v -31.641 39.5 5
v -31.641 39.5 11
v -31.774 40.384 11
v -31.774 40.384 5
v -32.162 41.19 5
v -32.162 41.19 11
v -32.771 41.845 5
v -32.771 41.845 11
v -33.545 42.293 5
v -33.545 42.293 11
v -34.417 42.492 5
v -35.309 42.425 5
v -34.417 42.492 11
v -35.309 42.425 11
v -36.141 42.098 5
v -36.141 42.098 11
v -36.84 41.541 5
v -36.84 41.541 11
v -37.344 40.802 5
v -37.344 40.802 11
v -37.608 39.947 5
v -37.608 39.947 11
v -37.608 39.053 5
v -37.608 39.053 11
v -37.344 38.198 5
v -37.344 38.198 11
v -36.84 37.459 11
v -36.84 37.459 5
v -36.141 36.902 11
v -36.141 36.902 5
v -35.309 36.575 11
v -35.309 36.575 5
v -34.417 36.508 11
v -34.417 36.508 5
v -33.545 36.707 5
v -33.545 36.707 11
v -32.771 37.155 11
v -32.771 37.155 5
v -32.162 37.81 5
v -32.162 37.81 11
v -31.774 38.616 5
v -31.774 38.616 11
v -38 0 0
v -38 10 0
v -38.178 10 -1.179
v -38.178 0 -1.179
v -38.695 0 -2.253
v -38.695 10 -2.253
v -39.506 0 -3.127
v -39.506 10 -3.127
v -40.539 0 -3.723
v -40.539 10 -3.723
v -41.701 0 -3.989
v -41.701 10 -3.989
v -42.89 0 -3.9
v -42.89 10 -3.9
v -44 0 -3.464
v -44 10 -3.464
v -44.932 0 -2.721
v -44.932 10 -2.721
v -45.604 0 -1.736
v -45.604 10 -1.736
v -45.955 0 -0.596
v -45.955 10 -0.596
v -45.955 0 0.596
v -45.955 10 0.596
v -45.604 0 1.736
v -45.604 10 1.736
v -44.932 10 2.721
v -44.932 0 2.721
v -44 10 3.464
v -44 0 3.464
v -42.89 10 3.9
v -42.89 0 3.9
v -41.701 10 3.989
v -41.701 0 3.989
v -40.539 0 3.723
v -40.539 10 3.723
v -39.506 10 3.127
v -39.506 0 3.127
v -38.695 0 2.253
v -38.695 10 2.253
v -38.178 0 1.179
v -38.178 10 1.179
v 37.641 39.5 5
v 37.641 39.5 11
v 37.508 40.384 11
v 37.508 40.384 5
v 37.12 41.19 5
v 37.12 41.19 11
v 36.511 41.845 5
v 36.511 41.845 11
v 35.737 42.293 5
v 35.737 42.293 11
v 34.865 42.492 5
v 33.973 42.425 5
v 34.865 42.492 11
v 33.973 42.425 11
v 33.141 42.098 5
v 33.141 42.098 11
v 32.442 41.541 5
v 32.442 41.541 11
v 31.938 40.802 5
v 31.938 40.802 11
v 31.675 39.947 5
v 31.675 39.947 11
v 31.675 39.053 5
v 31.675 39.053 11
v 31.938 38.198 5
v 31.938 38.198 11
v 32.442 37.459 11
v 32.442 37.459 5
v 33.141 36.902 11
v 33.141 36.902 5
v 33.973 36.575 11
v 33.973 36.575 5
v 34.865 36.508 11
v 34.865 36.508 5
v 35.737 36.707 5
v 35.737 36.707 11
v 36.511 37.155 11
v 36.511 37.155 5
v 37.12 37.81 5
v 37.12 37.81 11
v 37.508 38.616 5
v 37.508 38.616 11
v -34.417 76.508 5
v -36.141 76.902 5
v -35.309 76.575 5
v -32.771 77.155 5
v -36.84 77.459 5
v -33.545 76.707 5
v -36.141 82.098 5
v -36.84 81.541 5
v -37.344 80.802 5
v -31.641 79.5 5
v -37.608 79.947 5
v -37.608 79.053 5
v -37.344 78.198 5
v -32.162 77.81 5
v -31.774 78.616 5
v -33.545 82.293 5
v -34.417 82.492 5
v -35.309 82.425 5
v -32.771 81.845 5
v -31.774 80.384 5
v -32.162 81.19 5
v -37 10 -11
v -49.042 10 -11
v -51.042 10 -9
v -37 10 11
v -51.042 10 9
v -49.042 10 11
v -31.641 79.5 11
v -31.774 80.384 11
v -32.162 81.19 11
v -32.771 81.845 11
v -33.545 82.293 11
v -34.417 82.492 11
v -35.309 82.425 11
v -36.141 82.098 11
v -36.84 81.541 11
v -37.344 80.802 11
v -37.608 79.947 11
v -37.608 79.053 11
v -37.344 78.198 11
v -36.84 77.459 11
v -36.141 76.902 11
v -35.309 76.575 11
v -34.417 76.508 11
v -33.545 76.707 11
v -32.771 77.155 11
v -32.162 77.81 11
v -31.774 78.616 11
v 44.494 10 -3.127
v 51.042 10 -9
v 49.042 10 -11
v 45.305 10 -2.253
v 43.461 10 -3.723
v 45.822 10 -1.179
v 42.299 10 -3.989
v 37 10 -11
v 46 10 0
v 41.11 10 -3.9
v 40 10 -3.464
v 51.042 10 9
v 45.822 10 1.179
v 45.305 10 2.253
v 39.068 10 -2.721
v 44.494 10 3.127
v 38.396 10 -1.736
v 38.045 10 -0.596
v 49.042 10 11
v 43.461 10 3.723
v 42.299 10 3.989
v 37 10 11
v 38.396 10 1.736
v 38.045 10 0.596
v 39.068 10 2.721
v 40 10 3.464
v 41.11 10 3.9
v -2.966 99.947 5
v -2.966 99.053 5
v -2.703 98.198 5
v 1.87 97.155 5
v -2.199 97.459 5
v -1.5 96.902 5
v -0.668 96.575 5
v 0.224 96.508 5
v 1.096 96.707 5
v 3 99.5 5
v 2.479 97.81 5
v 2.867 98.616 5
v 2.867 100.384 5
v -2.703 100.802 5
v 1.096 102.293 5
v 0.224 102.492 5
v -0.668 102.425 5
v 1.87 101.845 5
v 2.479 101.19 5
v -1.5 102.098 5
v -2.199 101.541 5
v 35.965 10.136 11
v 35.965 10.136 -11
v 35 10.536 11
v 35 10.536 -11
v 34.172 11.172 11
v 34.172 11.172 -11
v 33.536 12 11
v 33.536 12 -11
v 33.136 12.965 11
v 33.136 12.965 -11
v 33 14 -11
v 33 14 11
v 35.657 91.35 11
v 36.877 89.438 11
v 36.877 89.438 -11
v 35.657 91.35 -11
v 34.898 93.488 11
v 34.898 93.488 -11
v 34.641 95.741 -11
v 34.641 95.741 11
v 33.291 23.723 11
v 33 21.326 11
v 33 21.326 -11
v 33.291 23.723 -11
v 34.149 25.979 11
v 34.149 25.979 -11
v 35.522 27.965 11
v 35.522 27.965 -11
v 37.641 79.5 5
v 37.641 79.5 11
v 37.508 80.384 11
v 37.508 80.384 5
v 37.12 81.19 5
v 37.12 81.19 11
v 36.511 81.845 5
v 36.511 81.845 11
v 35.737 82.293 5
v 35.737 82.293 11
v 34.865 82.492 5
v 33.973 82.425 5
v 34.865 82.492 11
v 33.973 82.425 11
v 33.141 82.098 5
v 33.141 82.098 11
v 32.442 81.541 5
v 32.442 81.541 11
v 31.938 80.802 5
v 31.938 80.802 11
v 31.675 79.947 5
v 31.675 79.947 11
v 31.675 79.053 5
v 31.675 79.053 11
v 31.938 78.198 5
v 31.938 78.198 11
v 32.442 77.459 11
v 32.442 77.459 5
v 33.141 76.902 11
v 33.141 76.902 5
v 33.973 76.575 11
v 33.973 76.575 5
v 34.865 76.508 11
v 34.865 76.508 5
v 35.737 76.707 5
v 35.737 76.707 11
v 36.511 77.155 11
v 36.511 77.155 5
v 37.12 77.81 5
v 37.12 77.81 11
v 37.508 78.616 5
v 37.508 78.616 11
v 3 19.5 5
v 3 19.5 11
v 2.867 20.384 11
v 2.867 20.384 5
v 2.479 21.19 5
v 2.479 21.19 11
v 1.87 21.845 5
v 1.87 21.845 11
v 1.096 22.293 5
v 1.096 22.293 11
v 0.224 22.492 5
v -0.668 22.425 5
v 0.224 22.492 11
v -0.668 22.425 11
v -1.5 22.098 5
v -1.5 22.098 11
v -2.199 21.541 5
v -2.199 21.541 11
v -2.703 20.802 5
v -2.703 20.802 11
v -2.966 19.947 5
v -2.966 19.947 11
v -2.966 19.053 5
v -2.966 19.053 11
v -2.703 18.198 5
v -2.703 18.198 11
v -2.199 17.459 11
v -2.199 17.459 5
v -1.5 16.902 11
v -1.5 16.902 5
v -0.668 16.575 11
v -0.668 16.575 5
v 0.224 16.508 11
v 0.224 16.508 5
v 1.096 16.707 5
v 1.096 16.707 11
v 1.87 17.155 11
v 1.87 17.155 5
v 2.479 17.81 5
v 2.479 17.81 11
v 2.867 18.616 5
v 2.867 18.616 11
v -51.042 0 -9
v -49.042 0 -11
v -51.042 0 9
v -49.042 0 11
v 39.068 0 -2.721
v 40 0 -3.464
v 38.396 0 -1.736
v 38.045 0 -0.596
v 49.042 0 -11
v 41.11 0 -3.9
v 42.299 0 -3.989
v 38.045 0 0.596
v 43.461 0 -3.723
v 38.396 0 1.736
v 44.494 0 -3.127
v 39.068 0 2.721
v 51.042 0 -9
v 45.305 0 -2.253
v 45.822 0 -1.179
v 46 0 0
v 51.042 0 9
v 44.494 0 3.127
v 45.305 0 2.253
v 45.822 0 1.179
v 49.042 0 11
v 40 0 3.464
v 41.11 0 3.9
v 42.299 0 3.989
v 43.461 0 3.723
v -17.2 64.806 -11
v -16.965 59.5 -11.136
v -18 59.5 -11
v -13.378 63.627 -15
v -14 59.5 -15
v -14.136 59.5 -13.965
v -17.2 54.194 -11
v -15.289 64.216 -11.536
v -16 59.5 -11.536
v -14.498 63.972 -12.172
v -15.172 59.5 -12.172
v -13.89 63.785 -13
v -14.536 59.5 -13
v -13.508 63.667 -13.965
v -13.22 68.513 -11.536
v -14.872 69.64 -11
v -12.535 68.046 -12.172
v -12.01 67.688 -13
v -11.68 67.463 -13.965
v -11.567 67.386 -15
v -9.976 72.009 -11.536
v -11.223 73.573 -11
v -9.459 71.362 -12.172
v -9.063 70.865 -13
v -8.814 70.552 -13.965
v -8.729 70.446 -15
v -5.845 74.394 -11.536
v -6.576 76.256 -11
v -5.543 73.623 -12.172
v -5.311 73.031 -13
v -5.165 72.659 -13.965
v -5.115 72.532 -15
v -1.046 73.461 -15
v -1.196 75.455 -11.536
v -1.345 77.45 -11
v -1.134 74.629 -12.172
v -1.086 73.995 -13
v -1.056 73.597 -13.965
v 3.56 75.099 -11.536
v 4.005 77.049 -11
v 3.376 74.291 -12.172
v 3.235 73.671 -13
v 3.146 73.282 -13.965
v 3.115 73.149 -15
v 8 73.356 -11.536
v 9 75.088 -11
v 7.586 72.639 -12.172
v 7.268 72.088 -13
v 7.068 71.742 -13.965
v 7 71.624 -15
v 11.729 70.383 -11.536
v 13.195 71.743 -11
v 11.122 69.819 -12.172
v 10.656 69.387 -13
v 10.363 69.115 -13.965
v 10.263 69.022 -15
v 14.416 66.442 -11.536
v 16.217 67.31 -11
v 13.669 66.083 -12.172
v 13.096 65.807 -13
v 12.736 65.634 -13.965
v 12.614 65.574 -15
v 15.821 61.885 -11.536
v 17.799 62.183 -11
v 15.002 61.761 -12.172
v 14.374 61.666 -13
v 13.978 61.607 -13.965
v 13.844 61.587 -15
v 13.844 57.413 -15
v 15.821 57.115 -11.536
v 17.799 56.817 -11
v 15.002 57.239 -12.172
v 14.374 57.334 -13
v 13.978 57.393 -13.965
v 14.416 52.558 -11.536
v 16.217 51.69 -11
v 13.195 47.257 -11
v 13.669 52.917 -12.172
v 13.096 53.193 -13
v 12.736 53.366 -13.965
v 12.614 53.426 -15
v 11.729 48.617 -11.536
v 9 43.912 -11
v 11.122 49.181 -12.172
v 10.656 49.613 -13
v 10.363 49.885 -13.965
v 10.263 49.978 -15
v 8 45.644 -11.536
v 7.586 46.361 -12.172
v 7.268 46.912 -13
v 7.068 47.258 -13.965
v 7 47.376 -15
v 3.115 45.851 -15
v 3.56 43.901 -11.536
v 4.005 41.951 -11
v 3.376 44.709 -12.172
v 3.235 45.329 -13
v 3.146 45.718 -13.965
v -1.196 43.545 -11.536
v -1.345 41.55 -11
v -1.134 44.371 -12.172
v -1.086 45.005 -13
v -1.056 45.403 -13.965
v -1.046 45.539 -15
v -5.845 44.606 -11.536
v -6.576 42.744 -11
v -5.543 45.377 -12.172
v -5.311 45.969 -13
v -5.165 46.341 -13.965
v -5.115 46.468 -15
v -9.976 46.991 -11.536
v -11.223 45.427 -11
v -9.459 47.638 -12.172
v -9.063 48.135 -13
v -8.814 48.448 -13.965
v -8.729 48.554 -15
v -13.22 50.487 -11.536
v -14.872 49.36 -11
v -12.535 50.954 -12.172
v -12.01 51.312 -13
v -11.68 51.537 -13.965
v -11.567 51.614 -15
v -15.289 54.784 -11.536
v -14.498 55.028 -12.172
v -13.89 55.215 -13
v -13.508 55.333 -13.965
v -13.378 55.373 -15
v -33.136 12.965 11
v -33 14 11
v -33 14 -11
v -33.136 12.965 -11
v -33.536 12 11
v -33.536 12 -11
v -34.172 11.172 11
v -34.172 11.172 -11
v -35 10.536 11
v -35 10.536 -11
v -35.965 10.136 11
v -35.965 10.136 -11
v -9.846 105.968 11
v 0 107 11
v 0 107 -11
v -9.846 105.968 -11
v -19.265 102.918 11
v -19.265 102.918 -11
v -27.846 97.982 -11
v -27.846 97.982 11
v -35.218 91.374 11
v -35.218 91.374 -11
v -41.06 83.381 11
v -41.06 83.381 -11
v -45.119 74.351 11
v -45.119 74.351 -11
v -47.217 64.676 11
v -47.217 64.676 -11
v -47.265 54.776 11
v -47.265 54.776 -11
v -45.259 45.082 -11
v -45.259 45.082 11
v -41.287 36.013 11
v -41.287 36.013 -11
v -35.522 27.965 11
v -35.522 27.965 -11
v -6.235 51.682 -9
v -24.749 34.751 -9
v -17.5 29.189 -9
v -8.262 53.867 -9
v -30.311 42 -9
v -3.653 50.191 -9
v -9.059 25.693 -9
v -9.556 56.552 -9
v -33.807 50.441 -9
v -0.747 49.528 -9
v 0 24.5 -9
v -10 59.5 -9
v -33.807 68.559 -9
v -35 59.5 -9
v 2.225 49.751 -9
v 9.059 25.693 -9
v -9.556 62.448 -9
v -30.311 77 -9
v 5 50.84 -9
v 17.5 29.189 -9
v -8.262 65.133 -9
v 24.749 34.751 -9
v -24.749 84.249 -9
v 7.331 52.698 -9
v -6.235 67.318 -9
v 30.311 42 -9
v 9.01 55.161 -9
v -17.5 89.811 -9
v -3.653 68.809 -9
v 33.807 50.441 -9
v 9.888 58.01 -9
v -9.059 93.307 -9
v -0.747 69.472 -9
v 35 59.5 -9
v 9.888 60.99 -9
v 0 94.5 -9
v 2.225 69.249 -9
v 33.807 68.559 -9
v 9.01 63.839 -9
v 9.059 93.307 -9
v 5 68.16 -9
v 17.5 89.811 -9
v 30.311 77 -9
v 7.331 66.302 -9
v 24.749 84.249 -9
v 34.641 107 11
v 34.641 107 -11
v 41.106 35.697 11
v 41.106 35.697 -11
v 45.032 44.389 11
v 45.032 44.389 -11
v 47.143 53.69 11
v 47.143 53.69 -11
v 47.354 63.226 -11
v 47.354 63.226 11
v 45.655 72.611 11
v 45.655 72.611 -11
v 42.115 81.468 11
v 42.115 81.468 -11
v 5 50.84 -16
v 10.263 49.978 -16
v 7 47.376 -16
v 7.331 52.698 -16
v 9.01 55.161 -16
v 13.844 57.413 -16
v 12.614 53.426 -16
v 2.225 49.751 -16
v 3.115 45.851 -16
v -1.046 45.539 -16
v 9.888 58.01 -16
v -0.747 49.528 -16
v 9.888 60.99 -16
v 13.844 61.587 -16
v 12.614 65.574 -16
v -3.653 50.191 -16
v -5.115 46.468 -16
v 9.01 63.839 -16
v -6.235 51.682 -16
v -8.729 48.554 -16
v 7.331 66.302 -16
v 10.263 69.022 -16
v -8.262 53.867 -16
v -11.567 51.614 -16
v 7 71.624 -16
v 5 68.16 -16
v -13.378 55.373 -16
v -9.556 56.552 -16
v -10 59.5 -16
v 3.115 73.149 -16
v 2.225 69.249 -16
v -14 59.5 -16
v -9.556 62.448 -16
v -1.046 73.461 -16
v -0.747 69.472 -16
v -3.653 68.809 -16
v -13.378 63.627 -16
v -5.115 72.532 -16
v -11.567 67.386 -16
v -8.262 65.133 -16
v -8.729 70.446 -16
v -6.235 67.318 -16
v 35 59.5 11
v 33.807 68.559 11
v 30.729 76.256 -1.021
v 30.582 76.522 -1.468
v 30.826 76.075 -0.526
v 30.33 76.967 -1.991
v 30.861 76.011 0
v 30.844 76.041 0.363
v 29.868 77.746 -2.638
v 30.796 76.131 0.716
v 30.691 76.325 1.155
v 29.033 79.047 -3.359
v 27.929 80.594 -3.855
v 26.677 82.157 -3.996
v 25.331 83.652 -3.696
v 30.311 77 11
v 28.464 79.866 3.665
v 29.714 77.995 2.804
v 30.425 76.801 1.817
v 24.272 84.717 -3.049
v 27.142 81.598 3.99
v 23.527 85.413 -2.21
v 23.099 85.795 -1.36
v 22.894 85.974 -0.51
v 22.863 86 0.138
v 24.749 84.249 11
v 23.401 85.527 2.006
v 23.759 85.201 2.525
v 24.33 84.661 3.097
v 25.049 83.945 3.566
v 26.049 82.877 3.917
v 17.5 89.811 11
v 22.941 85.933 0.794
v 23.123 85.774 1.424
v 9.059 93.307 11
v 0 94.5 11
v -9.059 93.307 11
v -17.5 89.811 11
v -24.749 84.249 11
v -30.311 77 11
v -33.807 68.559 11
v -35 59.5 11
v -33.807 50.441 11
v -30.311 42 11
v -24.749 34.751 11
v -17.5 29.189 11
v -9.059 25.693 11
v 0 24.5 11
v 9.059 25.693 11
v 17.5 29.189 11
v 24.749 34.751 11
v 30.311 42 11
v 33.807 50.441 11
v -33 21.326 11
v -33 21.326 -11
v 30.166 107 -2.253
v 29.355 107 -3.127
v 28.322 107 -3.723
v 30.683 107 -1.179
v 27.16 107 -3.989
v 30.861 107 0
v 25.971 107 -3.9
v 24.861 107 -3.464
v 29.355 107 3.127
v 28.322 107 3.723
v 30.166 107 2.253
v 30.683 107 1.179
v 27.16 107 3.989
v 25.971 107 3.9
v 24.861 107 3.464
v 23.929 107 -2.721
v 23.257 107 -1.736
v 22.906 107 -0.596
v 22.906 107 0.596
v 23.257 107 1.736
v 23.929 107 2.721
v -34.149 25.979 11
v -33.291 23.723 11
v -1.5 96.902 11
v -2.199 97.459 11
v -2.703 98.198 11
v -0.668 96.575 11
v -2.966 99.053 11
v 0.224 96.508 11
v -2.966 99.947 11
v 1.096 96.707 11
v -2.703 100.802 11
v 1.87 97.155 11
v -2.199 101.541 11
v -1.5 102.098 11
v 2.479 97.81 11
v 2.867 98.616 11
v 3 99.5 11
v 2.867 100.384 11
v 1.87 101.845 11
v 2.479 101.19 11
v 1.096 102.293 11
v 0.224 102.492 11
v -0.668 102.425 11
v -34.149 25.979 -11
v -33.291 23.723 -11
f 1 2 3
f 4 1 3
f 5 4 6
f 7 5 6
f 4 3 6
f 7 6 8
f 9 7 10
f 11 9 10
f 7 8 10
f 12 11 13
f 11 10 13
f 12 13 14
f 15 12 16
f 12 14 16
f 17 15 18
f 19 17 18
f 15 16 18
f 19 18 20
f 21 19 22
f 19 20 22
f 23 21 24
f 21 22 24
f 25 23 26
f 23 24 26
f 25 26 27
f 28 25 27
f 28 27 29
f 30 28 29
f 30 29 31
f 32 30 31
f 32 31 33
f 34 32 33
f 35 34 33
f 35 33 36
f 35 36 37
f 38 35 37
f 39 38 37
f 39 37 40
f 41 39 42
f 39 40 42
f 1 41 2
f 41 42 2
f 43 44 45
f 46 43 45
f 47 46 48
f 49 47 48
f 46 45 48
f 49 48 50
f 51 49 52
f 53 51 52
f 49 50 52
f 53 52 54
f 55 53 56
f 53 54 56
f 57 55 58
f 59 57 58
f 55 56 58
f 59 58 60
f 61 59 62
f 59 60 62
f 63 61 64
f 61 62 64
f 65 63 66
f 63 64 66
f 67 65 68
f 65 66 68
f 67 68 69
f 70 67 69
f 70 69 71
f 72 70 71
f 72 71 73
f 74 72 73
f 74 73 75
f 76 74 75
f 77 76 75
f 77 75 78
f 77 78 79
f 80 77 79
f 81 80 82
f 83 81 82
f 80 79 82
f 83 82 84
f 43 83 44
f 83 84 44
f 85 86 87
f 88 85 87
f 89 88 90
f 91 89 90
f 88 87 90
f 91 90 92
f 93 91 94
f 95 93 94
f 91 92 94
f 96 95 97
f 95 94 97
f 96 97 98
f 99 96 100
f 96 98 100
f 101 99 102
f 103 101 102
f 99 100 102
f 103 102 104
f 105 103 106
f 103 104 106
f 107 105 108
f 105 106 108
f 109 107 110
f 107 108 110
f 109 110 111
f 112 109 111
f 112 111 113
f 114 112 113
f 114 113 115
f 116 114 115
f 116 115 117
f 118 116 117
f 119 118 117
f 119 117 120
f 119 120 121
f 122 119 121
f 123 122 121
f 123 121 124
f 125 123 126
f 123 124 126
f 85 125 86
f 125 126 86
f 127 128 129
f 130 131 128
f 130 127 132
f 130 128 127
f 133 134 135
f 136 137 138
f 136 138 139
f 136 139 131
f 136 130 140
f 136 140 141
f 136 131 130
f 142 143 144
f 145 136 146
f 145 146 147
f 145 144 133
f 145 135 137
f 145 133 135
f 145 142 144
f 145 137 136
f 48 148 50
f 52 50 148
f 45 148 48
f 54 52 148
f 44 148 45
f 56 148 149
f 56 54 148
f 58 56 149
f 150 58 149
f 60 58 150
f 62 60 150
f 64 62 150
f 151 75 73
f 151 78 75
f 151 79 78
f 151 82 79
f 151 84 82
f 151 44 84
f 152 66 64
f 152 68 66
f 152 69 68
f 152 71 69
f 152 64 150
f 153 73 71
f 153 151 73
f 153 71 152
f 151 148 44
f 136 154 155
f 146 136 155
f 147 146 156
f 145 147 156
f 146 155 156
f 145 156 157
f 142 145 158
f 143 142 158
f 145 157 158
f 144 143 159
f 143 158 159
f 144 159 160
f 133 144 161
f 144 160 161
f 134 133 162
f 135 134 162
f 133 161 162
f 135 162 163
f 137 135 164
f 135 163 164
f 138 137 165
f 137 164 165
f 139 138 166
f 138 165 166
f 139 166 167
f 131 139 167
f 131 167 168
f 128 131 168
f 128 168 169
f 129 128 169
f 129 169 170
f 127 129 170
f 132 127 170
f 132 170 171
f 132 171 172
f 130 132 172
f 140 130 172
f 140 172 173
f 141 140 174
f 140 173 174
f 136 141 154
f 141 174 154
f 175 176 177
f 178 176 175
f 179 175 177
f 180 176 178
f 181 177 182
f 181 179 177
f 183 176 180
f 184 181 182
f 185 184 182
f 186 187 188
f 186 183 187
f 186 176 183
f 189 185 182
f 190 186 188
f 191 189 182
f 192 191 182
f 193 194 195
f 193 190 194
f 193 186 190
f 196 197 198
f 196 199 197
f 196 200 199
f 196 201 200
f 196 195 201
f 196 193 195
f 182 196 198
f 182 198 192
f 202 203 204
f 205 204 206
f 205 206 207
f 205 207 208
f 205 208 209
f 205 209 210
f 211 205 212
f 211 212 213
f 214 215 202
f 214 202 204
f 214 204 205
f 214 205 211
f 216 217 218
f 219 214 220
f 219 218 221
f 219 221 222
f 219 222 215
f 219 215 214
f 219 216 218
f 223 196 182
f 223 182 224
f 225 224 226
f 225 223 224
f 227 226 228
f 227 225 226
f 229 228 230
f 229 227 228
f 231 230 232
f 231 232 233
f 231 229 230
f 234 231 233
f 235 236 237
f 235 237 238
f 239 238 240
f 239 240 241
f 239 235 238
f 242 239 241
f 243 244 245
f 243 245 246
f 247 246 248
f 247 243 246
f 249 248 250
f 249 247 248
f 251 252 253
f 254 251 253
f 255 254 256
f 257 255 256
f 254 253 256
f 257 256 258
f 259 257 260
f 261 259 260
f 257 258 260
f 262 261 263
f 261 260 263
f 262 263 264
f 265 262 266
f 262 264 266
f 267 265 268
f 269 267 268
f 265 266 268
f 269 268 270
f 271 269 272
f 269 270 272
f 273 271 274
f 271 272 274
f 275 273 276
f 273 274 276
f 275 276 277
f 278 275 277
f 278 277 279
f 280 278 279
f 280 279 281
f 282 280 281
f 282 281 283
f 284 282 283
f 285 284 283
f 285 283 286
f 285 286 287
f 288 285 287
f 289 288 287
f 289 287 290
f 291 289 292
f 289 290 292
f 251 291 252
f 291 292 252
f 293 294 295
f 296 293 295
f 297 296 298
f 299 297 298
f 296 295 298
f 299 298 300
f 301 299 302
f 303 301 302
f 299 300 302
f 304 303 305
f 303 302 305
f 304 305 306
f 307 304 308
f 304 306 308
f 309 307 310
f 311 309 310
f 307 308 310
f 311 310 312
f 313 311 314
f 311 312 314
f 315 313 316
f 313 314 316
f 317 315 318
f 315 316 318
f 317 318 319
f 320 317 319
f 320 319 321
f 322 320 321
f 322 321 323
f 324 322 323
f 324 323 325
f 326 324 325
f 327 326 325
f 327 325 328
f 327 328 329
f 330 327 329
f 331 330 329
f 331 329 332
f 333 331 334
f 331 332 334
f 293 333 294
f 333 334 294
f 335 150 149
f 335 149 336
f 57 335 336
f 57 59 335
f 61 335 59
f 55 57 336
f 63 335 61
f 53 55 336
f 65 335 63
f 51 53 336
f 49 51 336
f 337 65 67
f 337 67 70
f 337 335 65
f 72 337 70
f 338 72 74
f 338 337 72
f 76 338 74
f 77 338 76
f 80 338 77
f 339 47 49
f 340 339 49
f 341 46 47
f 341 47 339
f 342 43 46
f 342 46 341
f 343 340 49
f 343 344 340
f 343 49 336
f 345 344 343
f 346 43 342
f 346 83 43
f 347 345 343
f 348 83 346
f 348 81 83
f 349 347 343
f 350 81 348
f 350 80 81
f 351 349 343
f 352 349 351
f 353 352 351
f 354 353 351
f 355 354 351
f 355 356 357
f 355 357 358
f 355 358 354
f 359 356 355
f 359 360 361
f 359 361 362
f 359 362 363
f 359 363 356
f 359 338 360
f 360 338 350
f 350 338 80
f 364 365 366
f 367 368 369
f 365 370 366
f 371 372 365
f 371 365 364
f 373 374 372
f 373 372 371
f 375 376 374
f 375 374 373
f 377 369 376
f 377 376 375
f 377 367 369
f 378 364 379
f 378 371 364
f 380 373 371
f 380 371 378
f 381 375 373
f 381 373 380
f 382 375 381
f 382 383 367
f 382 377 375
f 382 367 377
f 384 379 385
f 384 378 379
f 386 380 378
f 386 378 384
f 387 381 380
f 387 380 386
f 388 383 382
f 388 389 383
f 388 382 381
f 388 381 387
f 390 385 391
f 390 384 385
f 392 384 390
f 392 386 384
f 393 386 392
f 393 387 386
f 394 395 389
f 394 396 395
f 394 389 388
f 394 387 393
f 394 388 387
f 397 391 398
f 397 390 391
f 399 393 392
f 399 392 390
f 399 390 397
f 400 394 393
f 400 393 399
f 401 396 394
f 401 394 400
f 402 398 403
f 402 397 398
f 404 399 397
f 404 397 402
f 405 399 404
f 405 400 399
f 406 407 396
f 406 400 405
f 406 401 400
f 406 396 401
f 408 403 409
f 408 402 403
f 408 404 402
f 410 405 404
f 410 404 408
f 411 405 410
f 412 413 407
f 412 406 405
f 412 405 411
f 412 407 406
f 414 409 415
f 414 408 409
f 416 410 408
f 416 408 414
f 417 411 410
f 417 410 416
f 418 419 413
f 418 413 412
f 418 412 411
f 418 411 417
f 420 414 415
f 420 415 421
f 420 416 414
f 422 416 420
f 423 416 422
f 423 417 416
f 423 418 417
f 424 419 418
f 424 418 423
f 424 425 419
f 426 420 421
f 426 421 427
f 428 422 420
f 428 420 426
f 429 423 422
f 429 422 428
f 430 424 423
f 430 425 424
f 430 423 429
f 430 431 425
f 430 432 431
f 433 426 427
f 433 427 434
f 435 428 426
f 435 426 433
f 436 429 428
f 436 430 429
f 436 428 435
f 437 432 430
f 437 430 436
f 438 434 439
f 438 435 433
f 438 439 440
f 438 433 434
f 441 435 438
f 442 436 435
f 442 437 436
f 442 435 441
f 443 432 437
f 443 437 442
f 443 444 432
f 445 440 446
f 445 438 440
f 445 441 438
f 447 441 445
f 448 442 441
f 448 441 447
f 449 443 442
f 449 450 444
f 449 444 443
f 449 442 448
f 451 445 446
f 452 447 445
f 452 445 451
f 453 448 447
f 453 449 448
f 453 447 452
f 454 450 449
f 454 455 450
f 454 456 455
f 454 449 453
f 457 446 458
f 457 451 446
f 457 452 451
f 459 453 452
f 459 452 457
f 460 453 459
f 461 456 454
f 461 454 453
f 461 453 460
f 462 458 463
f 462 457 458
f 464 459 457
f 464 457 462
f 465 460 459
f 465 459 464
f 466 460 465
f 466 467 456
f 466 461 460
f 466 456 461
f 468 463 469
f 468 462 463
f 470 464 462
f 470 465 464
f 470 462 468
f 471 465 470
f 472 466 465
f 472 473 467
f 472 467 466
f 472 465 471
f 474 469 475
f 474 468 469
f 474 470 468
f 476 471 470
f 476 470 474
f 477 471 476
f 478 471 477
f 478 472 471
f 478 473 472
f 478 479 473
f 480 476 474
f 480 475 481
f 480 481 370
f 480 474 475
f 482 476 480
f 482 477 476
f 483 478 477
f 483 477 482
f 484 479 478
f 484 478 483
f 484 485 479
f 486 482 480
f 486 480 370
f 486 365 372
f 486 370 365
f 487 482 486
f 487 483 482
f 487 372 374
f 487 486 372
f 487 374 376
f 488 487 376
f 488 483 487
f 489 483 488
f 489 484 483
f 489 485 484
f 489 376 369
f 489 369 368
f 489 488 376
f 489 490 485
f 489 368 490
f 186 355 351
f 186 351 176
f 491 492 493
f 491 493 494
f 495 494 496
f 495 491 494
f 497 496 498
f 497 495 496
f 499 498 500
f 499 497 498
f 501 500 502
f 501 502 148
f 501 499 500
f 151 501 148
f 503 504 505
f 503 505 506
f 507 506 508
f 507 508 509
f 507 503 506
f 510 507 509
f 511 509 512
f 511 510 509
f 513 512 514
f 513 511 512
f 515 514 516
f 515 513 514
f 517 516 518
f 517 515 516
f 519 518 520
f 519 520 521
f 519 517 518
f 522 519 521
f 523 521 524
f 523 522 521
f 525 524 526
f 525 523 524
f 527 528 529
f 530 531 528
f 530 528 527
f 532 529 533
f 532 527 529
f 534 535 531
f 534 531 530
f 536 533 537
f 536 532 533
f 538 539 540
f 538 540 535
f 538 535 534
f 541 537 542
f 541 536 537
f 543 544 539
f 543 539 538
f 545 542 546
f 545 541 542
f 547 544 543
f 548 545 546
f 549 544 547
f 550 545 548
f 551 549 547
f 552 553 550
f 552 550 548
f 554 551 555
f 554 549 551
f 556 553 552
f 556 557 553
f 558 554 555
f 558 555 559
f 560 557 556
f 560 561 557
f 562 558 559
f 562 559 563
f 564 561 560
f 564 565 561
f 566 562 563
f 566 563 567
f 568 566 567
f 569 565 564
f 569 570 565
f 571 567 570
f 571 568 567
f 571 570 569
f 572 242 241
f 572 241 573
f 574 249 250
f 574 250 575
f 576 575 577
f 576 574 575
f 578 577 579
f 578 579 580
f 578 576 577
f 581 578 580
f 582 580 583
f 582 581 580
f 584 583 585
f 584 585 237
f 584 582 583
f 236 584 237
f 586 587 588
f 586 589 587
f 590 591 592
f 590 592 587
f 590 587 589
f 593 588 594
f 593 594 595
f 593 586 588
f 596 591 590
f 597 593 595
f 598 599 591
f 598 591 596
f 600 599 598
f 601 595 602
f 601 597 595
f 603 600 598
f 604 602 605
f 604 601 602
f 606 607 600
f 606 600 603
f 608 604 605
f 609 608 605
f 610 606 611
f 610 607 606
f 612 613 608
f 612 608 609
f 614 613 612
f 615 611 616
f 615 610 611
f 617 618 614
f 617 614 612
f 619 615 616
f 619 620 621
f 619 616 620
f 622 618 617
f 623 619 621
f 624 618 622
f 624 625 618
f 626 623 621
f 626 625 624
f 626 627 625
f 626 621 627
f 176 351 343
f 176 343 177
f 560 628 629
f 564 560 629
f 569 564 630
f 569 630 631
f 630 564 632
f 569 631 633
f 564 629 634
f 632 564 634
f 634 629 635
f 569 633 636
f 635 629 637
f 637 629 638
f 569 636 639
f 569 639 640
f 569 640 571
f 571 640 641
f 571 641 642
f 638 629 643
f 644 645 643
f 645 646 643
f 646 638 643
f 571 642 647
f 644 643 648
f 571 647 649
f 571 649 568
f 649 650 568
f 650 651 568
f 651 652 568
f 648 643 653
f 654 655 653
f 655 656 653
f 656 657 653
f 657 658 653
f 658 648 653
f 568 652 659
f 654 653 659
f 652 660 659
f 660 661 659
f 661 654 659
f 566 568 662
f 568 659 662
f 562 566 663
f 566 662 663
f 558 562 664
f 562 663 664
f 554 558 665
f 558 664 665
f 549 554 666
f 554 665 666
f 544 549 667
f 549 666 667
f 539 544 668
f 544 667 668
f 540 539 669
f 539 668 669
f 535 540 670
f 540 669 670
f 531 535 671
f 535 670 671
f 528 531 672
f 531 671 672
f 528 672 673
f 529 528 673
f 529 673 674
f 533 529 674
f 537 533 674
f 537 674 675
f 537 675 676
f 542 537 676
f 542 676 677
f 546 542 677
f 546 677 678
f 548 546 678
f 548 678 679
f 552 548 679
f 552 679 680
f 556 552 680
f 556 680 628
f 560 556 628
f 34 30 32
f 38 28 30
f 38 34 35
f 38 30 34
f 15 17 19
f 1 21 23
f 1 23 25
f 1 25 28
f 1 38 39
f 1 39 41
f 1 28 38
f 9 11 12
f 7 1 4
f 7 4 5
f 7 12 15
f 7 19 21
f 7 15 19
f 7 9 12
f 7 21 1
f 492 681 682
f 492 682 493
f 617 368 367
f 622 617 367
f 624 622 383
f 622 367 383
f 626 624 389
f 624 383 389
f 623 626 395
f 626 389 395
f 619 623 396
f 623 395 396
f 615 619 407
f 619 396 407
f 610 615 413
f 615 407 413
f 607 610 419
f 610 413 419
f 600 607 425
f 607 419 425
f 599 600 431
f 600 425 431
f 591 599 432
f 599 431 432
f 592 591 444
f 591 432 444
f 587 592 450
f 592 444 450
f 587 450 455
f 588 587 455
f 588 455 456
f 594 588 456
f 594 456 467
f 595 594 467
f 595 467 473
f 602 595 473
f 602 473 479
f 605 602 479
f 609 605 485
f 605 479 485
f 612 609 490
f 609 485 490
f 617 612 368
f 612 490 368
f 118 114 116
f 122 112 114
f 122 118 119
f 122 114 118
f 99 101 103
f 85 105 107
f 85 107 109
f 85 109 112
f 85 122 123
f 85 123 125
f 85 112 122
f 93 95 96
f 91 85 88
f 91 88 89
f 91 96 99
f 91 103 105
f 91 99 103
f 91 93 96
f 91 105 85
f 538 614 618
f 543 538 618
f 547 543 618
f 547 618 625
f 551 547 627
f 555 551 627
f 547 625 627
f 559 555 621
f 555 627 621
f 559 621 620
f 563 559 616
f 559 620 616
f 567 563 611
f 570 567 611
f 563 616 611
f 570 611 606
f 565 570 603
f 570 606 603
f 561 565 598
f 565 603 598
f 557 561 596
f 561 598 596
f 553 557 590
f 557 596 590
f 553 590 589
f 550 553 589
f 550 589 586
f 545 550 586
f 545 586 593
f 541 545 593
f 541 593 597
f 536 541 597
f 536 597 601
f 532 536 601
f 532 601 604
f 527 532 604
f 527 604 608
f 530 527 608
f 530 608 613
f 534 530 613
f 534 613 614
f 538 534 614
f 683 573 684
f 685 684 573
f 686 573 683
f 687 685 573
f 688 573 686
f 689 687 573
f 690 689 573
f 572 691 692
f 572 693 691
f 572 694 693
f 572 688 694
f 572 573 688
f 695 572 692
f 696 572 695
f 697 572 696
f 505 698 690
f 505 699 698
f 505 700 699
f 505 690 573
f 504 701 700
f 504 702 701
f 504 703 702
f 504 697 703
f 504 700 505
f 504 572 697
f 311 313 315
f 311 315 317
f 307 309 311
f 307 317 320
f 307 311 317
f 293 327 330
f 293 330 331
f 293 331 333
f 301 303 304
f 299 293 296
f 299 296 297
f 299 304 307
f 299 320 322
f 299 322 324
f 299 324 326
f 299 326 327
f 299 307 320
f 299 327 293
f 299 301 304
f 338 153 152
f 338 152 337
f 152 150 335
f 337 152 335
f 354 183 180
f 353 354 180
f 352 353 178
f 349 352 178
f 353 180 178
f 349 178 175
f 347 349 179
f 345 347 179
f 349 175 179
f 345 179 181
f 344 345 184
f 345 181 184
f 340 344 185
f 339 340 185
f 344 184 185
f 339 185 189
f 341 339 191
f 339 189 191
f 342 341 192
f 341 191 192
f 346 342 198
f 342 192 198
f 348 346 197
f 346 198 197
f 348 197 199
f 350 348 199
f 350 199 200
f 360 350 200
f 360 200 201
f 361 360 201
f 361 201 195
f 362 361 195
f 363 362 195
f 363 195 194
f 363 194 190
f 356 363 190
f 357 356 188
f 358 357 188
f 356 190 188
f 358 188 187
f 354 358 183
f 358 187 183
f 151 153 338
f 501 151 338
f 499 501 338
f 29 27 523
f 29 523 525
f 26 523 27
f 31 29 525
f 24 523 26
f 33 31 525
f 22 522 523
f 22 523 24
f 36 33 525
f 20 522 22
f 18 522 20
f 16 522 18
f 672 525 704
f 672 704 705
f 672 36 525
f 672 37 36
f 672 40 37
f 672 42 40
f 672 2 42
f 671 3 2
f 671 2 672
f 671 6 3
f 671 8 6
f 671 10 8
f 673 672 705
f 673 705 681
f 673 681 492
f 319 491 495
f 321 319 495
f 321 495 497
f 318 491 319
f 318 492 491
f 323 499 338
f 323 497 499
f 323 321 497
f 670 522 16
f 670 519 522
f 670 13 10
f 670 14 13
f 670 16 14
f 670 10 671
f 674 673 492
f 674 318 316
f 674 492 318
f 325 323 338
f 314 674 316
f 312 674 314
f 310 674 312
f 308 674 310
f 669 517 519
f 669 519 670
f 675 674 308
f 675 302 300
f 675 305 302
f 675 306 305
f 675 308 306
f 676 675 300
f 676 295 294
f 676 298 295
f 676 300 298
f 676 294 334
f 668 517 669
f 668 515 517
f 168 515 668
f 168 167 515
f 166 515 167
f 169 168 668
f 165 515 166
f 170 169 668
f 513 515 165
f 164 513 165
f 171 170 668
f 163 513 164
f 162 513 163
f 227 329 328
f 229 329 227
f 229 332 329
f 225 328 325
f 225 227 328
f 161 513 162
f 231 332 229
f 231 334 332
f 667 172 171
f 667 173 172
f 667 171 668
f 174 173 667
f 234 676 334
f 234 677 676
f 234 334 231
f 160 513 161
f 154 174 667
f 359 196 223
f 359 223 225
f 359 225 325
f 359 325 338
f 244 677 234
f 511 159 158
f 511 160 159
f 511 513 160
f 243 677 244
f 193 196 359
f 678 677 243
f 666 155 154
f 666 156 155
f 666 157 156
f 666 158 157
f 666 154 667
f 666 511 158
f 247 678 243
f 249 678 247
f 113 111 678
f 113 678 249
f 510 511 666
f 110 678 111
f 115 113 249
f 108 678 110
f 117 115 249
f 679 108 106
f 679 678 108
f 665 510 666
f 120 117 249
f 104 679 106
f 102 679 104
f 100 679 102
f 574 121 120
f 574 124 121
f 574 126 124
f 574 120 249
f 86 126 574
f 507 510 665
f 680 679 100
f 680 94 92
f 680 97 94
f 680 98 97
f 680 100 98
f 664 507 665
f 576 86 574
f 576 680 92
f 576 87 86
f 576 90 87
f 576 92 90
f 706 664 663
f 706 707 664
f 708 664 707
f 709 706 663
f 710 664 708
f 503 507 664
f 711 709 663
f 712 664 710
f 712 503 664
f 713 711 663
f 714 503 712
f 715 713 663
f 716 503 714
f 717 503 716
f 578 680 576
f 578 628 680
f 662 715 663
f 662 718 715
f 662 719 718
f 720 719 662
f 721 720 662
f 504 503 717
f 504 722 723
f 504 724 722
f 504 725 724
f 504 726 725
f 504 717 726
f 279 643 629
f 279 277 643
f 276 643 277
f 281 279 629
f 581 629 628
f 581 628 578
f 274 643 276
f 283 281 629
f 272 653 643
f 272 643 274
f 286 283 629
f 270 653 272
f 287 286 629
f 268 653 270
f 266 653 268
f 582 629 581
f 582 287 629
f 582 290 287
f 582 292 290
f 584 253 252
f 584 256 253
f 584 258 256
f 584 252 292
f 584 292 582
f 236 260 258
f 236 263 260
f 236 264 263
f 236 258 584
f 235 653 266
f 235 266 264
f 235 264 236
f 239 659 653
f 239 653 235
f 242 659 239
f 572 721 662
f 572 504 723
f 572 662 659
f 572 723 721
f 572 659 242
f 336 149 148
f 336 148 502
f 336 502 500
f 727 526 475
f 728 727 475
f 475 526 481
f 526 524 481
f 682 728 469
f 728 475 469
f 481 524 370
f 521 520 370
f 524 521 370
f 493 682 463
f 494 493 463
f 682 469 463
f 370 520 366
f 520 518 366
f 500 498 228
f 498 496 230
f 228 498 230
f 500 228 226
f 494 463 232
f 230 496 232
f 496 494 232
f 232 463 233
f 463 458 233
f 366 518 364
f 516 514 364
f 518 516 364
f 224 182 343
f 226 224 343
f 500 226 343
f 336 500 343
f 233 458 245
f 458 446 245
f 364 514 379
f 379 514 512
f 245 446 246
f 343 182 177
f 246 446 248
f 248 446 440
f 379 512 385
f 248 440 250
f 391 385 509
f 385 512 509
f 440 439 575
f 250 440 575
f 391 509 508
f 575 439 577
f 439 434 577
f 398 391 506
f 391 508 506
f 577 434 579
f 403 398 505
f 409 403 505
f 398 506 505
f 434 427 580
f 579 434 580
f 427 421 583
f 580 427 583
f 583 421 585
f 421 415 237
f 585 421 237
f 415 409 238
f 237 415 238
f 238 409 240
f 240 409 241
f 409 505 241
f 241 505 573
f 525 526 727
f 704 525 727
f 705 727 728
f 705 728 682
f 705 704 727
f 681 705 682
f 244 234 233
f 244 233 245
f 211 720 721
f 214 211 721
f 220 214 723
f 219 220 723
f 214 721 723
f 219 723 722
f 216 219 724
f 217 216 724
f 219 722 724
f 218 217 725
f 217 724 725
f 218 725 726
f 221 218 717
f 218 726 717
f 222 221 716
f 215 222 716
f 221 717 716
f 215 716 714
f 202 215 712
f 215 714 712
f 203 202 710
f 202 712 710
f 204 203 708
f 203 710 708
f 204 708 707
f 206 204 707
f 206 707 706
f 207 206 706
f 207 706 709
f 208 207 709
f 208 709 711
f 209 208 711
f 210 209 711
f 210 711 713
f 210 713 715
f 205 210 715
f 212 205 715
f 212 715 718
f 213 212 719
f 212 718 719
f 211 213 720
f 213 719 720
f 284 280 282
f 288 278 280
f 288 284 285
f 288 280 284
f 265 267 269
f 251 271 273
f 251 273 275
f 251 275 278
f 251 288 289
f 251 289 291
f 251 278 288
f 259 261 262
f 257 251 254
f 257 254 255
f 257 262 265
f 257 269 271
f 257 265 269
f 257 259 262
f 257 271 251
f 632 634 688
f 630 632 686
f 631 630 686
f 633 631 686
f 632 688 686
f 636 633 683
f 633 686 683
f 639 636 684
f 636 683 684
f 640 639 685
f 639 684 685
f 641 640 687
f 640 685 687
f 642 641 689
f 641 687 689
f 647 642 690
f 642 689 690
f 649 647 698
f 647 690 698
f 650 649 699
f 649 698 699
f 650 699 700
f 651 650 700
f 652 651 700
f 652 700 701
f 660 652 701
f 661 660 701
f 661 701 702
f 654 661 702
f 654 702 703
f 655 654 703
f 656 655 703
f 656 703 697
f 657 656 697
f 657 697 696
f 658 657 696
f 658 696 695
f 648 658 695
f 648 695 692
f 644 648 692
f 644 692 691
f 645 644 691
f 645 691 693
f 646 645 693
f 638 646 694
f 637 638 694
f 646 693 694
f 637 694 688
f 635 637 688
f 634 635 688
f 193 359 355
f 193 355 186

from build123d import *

# Parameters (mm, degrees)
BOSS_EXTRUDE1_DEPTH = 11
SKETCH2_R           = 35
CUT_EXTRUDE1_DEPTH  = 20
SKETCH3_R           = 14
BOSS_EXTRUDE2_DEPTH = 5
SKETCH4_R           = 10
CUT_EXTRUDE2_DEPTH  = 55
FILLET1_R           = 4
CHAMFER1_SIZE       = 2
SKETCH5_R           = 4
CUT_EXTRUDE3_DEPTH  = 10
SKETCH6_R           = 4
CUT_EXTRUDE4_DEPTH  = 31
SKETCH7_R           = 3
CUT_EXTRUDE5_DEPTH  = 6


with BuildPart() as part:
    # Sketch1 → Boss-Extrude1 (new body, symmetric)
    with BuildSketch(Plane.XY):
        with BuildLine():
            Line((-51.041834152, 0), (51.041834152, 0))
            Line((51.041834152, 0), (51.041834152, 10))
            Line((51.041834152, 10), (37, 10))
            ThreePointArc((37, 10), (34.171572875, 11.171572875), (33, 14))
            Line((33, 14), (33, 21.326056007))
            ThreePointArc((33, 21.326056007), (33.651668366, 24.876928527), (35.52173913, 27.965002788))
            ThreePointArc((35.52173913, 27.965002788), (47.48845464, 58.45277704), (36.877361169, 89.438440728))
            ThreePointArc((36.877361169, 89.438440728), (35.216671351, 92.397361701), (34.641016151, 95.741270355))
            Line((34.641016151, 95.741270355), (34.641016151, 107))
            Line((34.641016151, 107), (0, 107))
            ThreePointArc((0, 107), (-43.325294965, 78.972257605), (-35.52173913, 27.965002788))
            ThreePointArc((-35.52173913, 27.965002788), (-33.651668366, 24.876928527), (-33, 21.326056007))
            Line((-33, 21.326056007), (-33, 14))
            ThreePointArc((-33, 14), (-34.171572875, 11.171572875), (-37, 10))
            Line((-37, 10), (-51.041834152, 10))
            Line((-51.041834152, 10), (-51.041834152, 0))
        make_face()
    extrude(amount=BOSS_EXTRUDE1_DEPTH, both=True)

    # Sketch2 → Cut-Extrude1 (cut)
    with BuildSketch(Plane.XY.offset(11)):
        with Locations((0, 59.5)):
            Circle(SKETCH2_R)
    extrude(amount=-CUT_EXTRUDE1_DEPTH, mode=Mode.SUBTRACT)

    # Sketch3 → Boss-Extrude2 (add)
    with BuildSketch(Plane(origin=(0, 0, -11), x_dir=(-1, 0, 0), z_dir=(0, 0, -1))):
        with Locations((0, 59.5)):
            Circle(SKETCH3_R)
    extrude(amount=BOSS_EXTRUDE2_DEPTH)

    # Sketch4 → Cut-Extrude2 (cut)
    with BuildSketch(Plane(origin=(0, 0, -16), x_dir=(-1, 0, 0), z_dir=(0, 0, -1))):
        with Locations((0, 59.5)):
            Circle(SKETCH4_R)
    extrude(amount=-CUT_EXTRUDE2_DEPTH, mode=Mode.SUBTRACT)

    # Fillet1
    fillet1_edges = [part.edges().sort_by_distance(p)[0] for p in [
        (14, 59.5, -11),
    ]]
    fillet(fillet1_edges, radius=FILLET1_R)

    # Chamfer1
    chamfer1_edges = [part.edges().sort_by_distance(p)[0] for p in [
        (-51.041834152, 5, -11),
        (51.041834152, 5, -11),
        (51.041834152, 5, 11),
        (-51.041834152, 5, 11),
    ]]
    chamfer(chamfer1_edges, length=CHAMFER1_SIZE)

    # Sketch5 → Cut-Extrude3 (cut)
    with BuildSketch(Plane(origin=(0, 10, 0), x_dir=(1, 0, 0), z_dir=(0, 1, 0))):
        with Locations((-42, 0)):
            Circle(SKETCH5_R)
        with Locations((42, 0)):
            Circle(SKETCH5_R)
    extrude(amount=-CUT_EXTRUDE3_DEPTH, mode=Mode.SUBTRACT)

    # Sketch6 → Cut-Extrude4 (cut)
    with BuildSketch(Plane(origin=(0, 107, 0), x_dir=(1, 0, 0), z_dir=(0, 1, 0))):
        with Locations((26.861016151, 0)):
            Circle(SKETCH6_R)
    extrude(amount=-CUT_EXTRUDE4_DEPTH, mode=Mode.SUBTRACT)

    # Sketch7 → Cut-Extrude5 (cut)
    with BuildSketch(Plane.XY.offset(11)):
        with Locations((0, 99.5)):
            Circle(SKETCH7_R)
        with Locations((34.641016151, 79.5)):
            Circle(SKETCH7_R)
        with Locations((34.641016151, 39.5)):
            Circle(SKETCH7_R)
        with Locations((0, 19.5)):
            Circle(SKETCH7_R)
        with Locations((-34.641016151, 39.5)):
            Circle(SKETCH7_R)
        with Locations((-34.641016151, 79.5)):
            Circle(SKETCH7_R)
    extrude(amount=-CUT_EXTRUDE5_DEPTH, mode=Mode.SUBTRACT)


solid = part.part
